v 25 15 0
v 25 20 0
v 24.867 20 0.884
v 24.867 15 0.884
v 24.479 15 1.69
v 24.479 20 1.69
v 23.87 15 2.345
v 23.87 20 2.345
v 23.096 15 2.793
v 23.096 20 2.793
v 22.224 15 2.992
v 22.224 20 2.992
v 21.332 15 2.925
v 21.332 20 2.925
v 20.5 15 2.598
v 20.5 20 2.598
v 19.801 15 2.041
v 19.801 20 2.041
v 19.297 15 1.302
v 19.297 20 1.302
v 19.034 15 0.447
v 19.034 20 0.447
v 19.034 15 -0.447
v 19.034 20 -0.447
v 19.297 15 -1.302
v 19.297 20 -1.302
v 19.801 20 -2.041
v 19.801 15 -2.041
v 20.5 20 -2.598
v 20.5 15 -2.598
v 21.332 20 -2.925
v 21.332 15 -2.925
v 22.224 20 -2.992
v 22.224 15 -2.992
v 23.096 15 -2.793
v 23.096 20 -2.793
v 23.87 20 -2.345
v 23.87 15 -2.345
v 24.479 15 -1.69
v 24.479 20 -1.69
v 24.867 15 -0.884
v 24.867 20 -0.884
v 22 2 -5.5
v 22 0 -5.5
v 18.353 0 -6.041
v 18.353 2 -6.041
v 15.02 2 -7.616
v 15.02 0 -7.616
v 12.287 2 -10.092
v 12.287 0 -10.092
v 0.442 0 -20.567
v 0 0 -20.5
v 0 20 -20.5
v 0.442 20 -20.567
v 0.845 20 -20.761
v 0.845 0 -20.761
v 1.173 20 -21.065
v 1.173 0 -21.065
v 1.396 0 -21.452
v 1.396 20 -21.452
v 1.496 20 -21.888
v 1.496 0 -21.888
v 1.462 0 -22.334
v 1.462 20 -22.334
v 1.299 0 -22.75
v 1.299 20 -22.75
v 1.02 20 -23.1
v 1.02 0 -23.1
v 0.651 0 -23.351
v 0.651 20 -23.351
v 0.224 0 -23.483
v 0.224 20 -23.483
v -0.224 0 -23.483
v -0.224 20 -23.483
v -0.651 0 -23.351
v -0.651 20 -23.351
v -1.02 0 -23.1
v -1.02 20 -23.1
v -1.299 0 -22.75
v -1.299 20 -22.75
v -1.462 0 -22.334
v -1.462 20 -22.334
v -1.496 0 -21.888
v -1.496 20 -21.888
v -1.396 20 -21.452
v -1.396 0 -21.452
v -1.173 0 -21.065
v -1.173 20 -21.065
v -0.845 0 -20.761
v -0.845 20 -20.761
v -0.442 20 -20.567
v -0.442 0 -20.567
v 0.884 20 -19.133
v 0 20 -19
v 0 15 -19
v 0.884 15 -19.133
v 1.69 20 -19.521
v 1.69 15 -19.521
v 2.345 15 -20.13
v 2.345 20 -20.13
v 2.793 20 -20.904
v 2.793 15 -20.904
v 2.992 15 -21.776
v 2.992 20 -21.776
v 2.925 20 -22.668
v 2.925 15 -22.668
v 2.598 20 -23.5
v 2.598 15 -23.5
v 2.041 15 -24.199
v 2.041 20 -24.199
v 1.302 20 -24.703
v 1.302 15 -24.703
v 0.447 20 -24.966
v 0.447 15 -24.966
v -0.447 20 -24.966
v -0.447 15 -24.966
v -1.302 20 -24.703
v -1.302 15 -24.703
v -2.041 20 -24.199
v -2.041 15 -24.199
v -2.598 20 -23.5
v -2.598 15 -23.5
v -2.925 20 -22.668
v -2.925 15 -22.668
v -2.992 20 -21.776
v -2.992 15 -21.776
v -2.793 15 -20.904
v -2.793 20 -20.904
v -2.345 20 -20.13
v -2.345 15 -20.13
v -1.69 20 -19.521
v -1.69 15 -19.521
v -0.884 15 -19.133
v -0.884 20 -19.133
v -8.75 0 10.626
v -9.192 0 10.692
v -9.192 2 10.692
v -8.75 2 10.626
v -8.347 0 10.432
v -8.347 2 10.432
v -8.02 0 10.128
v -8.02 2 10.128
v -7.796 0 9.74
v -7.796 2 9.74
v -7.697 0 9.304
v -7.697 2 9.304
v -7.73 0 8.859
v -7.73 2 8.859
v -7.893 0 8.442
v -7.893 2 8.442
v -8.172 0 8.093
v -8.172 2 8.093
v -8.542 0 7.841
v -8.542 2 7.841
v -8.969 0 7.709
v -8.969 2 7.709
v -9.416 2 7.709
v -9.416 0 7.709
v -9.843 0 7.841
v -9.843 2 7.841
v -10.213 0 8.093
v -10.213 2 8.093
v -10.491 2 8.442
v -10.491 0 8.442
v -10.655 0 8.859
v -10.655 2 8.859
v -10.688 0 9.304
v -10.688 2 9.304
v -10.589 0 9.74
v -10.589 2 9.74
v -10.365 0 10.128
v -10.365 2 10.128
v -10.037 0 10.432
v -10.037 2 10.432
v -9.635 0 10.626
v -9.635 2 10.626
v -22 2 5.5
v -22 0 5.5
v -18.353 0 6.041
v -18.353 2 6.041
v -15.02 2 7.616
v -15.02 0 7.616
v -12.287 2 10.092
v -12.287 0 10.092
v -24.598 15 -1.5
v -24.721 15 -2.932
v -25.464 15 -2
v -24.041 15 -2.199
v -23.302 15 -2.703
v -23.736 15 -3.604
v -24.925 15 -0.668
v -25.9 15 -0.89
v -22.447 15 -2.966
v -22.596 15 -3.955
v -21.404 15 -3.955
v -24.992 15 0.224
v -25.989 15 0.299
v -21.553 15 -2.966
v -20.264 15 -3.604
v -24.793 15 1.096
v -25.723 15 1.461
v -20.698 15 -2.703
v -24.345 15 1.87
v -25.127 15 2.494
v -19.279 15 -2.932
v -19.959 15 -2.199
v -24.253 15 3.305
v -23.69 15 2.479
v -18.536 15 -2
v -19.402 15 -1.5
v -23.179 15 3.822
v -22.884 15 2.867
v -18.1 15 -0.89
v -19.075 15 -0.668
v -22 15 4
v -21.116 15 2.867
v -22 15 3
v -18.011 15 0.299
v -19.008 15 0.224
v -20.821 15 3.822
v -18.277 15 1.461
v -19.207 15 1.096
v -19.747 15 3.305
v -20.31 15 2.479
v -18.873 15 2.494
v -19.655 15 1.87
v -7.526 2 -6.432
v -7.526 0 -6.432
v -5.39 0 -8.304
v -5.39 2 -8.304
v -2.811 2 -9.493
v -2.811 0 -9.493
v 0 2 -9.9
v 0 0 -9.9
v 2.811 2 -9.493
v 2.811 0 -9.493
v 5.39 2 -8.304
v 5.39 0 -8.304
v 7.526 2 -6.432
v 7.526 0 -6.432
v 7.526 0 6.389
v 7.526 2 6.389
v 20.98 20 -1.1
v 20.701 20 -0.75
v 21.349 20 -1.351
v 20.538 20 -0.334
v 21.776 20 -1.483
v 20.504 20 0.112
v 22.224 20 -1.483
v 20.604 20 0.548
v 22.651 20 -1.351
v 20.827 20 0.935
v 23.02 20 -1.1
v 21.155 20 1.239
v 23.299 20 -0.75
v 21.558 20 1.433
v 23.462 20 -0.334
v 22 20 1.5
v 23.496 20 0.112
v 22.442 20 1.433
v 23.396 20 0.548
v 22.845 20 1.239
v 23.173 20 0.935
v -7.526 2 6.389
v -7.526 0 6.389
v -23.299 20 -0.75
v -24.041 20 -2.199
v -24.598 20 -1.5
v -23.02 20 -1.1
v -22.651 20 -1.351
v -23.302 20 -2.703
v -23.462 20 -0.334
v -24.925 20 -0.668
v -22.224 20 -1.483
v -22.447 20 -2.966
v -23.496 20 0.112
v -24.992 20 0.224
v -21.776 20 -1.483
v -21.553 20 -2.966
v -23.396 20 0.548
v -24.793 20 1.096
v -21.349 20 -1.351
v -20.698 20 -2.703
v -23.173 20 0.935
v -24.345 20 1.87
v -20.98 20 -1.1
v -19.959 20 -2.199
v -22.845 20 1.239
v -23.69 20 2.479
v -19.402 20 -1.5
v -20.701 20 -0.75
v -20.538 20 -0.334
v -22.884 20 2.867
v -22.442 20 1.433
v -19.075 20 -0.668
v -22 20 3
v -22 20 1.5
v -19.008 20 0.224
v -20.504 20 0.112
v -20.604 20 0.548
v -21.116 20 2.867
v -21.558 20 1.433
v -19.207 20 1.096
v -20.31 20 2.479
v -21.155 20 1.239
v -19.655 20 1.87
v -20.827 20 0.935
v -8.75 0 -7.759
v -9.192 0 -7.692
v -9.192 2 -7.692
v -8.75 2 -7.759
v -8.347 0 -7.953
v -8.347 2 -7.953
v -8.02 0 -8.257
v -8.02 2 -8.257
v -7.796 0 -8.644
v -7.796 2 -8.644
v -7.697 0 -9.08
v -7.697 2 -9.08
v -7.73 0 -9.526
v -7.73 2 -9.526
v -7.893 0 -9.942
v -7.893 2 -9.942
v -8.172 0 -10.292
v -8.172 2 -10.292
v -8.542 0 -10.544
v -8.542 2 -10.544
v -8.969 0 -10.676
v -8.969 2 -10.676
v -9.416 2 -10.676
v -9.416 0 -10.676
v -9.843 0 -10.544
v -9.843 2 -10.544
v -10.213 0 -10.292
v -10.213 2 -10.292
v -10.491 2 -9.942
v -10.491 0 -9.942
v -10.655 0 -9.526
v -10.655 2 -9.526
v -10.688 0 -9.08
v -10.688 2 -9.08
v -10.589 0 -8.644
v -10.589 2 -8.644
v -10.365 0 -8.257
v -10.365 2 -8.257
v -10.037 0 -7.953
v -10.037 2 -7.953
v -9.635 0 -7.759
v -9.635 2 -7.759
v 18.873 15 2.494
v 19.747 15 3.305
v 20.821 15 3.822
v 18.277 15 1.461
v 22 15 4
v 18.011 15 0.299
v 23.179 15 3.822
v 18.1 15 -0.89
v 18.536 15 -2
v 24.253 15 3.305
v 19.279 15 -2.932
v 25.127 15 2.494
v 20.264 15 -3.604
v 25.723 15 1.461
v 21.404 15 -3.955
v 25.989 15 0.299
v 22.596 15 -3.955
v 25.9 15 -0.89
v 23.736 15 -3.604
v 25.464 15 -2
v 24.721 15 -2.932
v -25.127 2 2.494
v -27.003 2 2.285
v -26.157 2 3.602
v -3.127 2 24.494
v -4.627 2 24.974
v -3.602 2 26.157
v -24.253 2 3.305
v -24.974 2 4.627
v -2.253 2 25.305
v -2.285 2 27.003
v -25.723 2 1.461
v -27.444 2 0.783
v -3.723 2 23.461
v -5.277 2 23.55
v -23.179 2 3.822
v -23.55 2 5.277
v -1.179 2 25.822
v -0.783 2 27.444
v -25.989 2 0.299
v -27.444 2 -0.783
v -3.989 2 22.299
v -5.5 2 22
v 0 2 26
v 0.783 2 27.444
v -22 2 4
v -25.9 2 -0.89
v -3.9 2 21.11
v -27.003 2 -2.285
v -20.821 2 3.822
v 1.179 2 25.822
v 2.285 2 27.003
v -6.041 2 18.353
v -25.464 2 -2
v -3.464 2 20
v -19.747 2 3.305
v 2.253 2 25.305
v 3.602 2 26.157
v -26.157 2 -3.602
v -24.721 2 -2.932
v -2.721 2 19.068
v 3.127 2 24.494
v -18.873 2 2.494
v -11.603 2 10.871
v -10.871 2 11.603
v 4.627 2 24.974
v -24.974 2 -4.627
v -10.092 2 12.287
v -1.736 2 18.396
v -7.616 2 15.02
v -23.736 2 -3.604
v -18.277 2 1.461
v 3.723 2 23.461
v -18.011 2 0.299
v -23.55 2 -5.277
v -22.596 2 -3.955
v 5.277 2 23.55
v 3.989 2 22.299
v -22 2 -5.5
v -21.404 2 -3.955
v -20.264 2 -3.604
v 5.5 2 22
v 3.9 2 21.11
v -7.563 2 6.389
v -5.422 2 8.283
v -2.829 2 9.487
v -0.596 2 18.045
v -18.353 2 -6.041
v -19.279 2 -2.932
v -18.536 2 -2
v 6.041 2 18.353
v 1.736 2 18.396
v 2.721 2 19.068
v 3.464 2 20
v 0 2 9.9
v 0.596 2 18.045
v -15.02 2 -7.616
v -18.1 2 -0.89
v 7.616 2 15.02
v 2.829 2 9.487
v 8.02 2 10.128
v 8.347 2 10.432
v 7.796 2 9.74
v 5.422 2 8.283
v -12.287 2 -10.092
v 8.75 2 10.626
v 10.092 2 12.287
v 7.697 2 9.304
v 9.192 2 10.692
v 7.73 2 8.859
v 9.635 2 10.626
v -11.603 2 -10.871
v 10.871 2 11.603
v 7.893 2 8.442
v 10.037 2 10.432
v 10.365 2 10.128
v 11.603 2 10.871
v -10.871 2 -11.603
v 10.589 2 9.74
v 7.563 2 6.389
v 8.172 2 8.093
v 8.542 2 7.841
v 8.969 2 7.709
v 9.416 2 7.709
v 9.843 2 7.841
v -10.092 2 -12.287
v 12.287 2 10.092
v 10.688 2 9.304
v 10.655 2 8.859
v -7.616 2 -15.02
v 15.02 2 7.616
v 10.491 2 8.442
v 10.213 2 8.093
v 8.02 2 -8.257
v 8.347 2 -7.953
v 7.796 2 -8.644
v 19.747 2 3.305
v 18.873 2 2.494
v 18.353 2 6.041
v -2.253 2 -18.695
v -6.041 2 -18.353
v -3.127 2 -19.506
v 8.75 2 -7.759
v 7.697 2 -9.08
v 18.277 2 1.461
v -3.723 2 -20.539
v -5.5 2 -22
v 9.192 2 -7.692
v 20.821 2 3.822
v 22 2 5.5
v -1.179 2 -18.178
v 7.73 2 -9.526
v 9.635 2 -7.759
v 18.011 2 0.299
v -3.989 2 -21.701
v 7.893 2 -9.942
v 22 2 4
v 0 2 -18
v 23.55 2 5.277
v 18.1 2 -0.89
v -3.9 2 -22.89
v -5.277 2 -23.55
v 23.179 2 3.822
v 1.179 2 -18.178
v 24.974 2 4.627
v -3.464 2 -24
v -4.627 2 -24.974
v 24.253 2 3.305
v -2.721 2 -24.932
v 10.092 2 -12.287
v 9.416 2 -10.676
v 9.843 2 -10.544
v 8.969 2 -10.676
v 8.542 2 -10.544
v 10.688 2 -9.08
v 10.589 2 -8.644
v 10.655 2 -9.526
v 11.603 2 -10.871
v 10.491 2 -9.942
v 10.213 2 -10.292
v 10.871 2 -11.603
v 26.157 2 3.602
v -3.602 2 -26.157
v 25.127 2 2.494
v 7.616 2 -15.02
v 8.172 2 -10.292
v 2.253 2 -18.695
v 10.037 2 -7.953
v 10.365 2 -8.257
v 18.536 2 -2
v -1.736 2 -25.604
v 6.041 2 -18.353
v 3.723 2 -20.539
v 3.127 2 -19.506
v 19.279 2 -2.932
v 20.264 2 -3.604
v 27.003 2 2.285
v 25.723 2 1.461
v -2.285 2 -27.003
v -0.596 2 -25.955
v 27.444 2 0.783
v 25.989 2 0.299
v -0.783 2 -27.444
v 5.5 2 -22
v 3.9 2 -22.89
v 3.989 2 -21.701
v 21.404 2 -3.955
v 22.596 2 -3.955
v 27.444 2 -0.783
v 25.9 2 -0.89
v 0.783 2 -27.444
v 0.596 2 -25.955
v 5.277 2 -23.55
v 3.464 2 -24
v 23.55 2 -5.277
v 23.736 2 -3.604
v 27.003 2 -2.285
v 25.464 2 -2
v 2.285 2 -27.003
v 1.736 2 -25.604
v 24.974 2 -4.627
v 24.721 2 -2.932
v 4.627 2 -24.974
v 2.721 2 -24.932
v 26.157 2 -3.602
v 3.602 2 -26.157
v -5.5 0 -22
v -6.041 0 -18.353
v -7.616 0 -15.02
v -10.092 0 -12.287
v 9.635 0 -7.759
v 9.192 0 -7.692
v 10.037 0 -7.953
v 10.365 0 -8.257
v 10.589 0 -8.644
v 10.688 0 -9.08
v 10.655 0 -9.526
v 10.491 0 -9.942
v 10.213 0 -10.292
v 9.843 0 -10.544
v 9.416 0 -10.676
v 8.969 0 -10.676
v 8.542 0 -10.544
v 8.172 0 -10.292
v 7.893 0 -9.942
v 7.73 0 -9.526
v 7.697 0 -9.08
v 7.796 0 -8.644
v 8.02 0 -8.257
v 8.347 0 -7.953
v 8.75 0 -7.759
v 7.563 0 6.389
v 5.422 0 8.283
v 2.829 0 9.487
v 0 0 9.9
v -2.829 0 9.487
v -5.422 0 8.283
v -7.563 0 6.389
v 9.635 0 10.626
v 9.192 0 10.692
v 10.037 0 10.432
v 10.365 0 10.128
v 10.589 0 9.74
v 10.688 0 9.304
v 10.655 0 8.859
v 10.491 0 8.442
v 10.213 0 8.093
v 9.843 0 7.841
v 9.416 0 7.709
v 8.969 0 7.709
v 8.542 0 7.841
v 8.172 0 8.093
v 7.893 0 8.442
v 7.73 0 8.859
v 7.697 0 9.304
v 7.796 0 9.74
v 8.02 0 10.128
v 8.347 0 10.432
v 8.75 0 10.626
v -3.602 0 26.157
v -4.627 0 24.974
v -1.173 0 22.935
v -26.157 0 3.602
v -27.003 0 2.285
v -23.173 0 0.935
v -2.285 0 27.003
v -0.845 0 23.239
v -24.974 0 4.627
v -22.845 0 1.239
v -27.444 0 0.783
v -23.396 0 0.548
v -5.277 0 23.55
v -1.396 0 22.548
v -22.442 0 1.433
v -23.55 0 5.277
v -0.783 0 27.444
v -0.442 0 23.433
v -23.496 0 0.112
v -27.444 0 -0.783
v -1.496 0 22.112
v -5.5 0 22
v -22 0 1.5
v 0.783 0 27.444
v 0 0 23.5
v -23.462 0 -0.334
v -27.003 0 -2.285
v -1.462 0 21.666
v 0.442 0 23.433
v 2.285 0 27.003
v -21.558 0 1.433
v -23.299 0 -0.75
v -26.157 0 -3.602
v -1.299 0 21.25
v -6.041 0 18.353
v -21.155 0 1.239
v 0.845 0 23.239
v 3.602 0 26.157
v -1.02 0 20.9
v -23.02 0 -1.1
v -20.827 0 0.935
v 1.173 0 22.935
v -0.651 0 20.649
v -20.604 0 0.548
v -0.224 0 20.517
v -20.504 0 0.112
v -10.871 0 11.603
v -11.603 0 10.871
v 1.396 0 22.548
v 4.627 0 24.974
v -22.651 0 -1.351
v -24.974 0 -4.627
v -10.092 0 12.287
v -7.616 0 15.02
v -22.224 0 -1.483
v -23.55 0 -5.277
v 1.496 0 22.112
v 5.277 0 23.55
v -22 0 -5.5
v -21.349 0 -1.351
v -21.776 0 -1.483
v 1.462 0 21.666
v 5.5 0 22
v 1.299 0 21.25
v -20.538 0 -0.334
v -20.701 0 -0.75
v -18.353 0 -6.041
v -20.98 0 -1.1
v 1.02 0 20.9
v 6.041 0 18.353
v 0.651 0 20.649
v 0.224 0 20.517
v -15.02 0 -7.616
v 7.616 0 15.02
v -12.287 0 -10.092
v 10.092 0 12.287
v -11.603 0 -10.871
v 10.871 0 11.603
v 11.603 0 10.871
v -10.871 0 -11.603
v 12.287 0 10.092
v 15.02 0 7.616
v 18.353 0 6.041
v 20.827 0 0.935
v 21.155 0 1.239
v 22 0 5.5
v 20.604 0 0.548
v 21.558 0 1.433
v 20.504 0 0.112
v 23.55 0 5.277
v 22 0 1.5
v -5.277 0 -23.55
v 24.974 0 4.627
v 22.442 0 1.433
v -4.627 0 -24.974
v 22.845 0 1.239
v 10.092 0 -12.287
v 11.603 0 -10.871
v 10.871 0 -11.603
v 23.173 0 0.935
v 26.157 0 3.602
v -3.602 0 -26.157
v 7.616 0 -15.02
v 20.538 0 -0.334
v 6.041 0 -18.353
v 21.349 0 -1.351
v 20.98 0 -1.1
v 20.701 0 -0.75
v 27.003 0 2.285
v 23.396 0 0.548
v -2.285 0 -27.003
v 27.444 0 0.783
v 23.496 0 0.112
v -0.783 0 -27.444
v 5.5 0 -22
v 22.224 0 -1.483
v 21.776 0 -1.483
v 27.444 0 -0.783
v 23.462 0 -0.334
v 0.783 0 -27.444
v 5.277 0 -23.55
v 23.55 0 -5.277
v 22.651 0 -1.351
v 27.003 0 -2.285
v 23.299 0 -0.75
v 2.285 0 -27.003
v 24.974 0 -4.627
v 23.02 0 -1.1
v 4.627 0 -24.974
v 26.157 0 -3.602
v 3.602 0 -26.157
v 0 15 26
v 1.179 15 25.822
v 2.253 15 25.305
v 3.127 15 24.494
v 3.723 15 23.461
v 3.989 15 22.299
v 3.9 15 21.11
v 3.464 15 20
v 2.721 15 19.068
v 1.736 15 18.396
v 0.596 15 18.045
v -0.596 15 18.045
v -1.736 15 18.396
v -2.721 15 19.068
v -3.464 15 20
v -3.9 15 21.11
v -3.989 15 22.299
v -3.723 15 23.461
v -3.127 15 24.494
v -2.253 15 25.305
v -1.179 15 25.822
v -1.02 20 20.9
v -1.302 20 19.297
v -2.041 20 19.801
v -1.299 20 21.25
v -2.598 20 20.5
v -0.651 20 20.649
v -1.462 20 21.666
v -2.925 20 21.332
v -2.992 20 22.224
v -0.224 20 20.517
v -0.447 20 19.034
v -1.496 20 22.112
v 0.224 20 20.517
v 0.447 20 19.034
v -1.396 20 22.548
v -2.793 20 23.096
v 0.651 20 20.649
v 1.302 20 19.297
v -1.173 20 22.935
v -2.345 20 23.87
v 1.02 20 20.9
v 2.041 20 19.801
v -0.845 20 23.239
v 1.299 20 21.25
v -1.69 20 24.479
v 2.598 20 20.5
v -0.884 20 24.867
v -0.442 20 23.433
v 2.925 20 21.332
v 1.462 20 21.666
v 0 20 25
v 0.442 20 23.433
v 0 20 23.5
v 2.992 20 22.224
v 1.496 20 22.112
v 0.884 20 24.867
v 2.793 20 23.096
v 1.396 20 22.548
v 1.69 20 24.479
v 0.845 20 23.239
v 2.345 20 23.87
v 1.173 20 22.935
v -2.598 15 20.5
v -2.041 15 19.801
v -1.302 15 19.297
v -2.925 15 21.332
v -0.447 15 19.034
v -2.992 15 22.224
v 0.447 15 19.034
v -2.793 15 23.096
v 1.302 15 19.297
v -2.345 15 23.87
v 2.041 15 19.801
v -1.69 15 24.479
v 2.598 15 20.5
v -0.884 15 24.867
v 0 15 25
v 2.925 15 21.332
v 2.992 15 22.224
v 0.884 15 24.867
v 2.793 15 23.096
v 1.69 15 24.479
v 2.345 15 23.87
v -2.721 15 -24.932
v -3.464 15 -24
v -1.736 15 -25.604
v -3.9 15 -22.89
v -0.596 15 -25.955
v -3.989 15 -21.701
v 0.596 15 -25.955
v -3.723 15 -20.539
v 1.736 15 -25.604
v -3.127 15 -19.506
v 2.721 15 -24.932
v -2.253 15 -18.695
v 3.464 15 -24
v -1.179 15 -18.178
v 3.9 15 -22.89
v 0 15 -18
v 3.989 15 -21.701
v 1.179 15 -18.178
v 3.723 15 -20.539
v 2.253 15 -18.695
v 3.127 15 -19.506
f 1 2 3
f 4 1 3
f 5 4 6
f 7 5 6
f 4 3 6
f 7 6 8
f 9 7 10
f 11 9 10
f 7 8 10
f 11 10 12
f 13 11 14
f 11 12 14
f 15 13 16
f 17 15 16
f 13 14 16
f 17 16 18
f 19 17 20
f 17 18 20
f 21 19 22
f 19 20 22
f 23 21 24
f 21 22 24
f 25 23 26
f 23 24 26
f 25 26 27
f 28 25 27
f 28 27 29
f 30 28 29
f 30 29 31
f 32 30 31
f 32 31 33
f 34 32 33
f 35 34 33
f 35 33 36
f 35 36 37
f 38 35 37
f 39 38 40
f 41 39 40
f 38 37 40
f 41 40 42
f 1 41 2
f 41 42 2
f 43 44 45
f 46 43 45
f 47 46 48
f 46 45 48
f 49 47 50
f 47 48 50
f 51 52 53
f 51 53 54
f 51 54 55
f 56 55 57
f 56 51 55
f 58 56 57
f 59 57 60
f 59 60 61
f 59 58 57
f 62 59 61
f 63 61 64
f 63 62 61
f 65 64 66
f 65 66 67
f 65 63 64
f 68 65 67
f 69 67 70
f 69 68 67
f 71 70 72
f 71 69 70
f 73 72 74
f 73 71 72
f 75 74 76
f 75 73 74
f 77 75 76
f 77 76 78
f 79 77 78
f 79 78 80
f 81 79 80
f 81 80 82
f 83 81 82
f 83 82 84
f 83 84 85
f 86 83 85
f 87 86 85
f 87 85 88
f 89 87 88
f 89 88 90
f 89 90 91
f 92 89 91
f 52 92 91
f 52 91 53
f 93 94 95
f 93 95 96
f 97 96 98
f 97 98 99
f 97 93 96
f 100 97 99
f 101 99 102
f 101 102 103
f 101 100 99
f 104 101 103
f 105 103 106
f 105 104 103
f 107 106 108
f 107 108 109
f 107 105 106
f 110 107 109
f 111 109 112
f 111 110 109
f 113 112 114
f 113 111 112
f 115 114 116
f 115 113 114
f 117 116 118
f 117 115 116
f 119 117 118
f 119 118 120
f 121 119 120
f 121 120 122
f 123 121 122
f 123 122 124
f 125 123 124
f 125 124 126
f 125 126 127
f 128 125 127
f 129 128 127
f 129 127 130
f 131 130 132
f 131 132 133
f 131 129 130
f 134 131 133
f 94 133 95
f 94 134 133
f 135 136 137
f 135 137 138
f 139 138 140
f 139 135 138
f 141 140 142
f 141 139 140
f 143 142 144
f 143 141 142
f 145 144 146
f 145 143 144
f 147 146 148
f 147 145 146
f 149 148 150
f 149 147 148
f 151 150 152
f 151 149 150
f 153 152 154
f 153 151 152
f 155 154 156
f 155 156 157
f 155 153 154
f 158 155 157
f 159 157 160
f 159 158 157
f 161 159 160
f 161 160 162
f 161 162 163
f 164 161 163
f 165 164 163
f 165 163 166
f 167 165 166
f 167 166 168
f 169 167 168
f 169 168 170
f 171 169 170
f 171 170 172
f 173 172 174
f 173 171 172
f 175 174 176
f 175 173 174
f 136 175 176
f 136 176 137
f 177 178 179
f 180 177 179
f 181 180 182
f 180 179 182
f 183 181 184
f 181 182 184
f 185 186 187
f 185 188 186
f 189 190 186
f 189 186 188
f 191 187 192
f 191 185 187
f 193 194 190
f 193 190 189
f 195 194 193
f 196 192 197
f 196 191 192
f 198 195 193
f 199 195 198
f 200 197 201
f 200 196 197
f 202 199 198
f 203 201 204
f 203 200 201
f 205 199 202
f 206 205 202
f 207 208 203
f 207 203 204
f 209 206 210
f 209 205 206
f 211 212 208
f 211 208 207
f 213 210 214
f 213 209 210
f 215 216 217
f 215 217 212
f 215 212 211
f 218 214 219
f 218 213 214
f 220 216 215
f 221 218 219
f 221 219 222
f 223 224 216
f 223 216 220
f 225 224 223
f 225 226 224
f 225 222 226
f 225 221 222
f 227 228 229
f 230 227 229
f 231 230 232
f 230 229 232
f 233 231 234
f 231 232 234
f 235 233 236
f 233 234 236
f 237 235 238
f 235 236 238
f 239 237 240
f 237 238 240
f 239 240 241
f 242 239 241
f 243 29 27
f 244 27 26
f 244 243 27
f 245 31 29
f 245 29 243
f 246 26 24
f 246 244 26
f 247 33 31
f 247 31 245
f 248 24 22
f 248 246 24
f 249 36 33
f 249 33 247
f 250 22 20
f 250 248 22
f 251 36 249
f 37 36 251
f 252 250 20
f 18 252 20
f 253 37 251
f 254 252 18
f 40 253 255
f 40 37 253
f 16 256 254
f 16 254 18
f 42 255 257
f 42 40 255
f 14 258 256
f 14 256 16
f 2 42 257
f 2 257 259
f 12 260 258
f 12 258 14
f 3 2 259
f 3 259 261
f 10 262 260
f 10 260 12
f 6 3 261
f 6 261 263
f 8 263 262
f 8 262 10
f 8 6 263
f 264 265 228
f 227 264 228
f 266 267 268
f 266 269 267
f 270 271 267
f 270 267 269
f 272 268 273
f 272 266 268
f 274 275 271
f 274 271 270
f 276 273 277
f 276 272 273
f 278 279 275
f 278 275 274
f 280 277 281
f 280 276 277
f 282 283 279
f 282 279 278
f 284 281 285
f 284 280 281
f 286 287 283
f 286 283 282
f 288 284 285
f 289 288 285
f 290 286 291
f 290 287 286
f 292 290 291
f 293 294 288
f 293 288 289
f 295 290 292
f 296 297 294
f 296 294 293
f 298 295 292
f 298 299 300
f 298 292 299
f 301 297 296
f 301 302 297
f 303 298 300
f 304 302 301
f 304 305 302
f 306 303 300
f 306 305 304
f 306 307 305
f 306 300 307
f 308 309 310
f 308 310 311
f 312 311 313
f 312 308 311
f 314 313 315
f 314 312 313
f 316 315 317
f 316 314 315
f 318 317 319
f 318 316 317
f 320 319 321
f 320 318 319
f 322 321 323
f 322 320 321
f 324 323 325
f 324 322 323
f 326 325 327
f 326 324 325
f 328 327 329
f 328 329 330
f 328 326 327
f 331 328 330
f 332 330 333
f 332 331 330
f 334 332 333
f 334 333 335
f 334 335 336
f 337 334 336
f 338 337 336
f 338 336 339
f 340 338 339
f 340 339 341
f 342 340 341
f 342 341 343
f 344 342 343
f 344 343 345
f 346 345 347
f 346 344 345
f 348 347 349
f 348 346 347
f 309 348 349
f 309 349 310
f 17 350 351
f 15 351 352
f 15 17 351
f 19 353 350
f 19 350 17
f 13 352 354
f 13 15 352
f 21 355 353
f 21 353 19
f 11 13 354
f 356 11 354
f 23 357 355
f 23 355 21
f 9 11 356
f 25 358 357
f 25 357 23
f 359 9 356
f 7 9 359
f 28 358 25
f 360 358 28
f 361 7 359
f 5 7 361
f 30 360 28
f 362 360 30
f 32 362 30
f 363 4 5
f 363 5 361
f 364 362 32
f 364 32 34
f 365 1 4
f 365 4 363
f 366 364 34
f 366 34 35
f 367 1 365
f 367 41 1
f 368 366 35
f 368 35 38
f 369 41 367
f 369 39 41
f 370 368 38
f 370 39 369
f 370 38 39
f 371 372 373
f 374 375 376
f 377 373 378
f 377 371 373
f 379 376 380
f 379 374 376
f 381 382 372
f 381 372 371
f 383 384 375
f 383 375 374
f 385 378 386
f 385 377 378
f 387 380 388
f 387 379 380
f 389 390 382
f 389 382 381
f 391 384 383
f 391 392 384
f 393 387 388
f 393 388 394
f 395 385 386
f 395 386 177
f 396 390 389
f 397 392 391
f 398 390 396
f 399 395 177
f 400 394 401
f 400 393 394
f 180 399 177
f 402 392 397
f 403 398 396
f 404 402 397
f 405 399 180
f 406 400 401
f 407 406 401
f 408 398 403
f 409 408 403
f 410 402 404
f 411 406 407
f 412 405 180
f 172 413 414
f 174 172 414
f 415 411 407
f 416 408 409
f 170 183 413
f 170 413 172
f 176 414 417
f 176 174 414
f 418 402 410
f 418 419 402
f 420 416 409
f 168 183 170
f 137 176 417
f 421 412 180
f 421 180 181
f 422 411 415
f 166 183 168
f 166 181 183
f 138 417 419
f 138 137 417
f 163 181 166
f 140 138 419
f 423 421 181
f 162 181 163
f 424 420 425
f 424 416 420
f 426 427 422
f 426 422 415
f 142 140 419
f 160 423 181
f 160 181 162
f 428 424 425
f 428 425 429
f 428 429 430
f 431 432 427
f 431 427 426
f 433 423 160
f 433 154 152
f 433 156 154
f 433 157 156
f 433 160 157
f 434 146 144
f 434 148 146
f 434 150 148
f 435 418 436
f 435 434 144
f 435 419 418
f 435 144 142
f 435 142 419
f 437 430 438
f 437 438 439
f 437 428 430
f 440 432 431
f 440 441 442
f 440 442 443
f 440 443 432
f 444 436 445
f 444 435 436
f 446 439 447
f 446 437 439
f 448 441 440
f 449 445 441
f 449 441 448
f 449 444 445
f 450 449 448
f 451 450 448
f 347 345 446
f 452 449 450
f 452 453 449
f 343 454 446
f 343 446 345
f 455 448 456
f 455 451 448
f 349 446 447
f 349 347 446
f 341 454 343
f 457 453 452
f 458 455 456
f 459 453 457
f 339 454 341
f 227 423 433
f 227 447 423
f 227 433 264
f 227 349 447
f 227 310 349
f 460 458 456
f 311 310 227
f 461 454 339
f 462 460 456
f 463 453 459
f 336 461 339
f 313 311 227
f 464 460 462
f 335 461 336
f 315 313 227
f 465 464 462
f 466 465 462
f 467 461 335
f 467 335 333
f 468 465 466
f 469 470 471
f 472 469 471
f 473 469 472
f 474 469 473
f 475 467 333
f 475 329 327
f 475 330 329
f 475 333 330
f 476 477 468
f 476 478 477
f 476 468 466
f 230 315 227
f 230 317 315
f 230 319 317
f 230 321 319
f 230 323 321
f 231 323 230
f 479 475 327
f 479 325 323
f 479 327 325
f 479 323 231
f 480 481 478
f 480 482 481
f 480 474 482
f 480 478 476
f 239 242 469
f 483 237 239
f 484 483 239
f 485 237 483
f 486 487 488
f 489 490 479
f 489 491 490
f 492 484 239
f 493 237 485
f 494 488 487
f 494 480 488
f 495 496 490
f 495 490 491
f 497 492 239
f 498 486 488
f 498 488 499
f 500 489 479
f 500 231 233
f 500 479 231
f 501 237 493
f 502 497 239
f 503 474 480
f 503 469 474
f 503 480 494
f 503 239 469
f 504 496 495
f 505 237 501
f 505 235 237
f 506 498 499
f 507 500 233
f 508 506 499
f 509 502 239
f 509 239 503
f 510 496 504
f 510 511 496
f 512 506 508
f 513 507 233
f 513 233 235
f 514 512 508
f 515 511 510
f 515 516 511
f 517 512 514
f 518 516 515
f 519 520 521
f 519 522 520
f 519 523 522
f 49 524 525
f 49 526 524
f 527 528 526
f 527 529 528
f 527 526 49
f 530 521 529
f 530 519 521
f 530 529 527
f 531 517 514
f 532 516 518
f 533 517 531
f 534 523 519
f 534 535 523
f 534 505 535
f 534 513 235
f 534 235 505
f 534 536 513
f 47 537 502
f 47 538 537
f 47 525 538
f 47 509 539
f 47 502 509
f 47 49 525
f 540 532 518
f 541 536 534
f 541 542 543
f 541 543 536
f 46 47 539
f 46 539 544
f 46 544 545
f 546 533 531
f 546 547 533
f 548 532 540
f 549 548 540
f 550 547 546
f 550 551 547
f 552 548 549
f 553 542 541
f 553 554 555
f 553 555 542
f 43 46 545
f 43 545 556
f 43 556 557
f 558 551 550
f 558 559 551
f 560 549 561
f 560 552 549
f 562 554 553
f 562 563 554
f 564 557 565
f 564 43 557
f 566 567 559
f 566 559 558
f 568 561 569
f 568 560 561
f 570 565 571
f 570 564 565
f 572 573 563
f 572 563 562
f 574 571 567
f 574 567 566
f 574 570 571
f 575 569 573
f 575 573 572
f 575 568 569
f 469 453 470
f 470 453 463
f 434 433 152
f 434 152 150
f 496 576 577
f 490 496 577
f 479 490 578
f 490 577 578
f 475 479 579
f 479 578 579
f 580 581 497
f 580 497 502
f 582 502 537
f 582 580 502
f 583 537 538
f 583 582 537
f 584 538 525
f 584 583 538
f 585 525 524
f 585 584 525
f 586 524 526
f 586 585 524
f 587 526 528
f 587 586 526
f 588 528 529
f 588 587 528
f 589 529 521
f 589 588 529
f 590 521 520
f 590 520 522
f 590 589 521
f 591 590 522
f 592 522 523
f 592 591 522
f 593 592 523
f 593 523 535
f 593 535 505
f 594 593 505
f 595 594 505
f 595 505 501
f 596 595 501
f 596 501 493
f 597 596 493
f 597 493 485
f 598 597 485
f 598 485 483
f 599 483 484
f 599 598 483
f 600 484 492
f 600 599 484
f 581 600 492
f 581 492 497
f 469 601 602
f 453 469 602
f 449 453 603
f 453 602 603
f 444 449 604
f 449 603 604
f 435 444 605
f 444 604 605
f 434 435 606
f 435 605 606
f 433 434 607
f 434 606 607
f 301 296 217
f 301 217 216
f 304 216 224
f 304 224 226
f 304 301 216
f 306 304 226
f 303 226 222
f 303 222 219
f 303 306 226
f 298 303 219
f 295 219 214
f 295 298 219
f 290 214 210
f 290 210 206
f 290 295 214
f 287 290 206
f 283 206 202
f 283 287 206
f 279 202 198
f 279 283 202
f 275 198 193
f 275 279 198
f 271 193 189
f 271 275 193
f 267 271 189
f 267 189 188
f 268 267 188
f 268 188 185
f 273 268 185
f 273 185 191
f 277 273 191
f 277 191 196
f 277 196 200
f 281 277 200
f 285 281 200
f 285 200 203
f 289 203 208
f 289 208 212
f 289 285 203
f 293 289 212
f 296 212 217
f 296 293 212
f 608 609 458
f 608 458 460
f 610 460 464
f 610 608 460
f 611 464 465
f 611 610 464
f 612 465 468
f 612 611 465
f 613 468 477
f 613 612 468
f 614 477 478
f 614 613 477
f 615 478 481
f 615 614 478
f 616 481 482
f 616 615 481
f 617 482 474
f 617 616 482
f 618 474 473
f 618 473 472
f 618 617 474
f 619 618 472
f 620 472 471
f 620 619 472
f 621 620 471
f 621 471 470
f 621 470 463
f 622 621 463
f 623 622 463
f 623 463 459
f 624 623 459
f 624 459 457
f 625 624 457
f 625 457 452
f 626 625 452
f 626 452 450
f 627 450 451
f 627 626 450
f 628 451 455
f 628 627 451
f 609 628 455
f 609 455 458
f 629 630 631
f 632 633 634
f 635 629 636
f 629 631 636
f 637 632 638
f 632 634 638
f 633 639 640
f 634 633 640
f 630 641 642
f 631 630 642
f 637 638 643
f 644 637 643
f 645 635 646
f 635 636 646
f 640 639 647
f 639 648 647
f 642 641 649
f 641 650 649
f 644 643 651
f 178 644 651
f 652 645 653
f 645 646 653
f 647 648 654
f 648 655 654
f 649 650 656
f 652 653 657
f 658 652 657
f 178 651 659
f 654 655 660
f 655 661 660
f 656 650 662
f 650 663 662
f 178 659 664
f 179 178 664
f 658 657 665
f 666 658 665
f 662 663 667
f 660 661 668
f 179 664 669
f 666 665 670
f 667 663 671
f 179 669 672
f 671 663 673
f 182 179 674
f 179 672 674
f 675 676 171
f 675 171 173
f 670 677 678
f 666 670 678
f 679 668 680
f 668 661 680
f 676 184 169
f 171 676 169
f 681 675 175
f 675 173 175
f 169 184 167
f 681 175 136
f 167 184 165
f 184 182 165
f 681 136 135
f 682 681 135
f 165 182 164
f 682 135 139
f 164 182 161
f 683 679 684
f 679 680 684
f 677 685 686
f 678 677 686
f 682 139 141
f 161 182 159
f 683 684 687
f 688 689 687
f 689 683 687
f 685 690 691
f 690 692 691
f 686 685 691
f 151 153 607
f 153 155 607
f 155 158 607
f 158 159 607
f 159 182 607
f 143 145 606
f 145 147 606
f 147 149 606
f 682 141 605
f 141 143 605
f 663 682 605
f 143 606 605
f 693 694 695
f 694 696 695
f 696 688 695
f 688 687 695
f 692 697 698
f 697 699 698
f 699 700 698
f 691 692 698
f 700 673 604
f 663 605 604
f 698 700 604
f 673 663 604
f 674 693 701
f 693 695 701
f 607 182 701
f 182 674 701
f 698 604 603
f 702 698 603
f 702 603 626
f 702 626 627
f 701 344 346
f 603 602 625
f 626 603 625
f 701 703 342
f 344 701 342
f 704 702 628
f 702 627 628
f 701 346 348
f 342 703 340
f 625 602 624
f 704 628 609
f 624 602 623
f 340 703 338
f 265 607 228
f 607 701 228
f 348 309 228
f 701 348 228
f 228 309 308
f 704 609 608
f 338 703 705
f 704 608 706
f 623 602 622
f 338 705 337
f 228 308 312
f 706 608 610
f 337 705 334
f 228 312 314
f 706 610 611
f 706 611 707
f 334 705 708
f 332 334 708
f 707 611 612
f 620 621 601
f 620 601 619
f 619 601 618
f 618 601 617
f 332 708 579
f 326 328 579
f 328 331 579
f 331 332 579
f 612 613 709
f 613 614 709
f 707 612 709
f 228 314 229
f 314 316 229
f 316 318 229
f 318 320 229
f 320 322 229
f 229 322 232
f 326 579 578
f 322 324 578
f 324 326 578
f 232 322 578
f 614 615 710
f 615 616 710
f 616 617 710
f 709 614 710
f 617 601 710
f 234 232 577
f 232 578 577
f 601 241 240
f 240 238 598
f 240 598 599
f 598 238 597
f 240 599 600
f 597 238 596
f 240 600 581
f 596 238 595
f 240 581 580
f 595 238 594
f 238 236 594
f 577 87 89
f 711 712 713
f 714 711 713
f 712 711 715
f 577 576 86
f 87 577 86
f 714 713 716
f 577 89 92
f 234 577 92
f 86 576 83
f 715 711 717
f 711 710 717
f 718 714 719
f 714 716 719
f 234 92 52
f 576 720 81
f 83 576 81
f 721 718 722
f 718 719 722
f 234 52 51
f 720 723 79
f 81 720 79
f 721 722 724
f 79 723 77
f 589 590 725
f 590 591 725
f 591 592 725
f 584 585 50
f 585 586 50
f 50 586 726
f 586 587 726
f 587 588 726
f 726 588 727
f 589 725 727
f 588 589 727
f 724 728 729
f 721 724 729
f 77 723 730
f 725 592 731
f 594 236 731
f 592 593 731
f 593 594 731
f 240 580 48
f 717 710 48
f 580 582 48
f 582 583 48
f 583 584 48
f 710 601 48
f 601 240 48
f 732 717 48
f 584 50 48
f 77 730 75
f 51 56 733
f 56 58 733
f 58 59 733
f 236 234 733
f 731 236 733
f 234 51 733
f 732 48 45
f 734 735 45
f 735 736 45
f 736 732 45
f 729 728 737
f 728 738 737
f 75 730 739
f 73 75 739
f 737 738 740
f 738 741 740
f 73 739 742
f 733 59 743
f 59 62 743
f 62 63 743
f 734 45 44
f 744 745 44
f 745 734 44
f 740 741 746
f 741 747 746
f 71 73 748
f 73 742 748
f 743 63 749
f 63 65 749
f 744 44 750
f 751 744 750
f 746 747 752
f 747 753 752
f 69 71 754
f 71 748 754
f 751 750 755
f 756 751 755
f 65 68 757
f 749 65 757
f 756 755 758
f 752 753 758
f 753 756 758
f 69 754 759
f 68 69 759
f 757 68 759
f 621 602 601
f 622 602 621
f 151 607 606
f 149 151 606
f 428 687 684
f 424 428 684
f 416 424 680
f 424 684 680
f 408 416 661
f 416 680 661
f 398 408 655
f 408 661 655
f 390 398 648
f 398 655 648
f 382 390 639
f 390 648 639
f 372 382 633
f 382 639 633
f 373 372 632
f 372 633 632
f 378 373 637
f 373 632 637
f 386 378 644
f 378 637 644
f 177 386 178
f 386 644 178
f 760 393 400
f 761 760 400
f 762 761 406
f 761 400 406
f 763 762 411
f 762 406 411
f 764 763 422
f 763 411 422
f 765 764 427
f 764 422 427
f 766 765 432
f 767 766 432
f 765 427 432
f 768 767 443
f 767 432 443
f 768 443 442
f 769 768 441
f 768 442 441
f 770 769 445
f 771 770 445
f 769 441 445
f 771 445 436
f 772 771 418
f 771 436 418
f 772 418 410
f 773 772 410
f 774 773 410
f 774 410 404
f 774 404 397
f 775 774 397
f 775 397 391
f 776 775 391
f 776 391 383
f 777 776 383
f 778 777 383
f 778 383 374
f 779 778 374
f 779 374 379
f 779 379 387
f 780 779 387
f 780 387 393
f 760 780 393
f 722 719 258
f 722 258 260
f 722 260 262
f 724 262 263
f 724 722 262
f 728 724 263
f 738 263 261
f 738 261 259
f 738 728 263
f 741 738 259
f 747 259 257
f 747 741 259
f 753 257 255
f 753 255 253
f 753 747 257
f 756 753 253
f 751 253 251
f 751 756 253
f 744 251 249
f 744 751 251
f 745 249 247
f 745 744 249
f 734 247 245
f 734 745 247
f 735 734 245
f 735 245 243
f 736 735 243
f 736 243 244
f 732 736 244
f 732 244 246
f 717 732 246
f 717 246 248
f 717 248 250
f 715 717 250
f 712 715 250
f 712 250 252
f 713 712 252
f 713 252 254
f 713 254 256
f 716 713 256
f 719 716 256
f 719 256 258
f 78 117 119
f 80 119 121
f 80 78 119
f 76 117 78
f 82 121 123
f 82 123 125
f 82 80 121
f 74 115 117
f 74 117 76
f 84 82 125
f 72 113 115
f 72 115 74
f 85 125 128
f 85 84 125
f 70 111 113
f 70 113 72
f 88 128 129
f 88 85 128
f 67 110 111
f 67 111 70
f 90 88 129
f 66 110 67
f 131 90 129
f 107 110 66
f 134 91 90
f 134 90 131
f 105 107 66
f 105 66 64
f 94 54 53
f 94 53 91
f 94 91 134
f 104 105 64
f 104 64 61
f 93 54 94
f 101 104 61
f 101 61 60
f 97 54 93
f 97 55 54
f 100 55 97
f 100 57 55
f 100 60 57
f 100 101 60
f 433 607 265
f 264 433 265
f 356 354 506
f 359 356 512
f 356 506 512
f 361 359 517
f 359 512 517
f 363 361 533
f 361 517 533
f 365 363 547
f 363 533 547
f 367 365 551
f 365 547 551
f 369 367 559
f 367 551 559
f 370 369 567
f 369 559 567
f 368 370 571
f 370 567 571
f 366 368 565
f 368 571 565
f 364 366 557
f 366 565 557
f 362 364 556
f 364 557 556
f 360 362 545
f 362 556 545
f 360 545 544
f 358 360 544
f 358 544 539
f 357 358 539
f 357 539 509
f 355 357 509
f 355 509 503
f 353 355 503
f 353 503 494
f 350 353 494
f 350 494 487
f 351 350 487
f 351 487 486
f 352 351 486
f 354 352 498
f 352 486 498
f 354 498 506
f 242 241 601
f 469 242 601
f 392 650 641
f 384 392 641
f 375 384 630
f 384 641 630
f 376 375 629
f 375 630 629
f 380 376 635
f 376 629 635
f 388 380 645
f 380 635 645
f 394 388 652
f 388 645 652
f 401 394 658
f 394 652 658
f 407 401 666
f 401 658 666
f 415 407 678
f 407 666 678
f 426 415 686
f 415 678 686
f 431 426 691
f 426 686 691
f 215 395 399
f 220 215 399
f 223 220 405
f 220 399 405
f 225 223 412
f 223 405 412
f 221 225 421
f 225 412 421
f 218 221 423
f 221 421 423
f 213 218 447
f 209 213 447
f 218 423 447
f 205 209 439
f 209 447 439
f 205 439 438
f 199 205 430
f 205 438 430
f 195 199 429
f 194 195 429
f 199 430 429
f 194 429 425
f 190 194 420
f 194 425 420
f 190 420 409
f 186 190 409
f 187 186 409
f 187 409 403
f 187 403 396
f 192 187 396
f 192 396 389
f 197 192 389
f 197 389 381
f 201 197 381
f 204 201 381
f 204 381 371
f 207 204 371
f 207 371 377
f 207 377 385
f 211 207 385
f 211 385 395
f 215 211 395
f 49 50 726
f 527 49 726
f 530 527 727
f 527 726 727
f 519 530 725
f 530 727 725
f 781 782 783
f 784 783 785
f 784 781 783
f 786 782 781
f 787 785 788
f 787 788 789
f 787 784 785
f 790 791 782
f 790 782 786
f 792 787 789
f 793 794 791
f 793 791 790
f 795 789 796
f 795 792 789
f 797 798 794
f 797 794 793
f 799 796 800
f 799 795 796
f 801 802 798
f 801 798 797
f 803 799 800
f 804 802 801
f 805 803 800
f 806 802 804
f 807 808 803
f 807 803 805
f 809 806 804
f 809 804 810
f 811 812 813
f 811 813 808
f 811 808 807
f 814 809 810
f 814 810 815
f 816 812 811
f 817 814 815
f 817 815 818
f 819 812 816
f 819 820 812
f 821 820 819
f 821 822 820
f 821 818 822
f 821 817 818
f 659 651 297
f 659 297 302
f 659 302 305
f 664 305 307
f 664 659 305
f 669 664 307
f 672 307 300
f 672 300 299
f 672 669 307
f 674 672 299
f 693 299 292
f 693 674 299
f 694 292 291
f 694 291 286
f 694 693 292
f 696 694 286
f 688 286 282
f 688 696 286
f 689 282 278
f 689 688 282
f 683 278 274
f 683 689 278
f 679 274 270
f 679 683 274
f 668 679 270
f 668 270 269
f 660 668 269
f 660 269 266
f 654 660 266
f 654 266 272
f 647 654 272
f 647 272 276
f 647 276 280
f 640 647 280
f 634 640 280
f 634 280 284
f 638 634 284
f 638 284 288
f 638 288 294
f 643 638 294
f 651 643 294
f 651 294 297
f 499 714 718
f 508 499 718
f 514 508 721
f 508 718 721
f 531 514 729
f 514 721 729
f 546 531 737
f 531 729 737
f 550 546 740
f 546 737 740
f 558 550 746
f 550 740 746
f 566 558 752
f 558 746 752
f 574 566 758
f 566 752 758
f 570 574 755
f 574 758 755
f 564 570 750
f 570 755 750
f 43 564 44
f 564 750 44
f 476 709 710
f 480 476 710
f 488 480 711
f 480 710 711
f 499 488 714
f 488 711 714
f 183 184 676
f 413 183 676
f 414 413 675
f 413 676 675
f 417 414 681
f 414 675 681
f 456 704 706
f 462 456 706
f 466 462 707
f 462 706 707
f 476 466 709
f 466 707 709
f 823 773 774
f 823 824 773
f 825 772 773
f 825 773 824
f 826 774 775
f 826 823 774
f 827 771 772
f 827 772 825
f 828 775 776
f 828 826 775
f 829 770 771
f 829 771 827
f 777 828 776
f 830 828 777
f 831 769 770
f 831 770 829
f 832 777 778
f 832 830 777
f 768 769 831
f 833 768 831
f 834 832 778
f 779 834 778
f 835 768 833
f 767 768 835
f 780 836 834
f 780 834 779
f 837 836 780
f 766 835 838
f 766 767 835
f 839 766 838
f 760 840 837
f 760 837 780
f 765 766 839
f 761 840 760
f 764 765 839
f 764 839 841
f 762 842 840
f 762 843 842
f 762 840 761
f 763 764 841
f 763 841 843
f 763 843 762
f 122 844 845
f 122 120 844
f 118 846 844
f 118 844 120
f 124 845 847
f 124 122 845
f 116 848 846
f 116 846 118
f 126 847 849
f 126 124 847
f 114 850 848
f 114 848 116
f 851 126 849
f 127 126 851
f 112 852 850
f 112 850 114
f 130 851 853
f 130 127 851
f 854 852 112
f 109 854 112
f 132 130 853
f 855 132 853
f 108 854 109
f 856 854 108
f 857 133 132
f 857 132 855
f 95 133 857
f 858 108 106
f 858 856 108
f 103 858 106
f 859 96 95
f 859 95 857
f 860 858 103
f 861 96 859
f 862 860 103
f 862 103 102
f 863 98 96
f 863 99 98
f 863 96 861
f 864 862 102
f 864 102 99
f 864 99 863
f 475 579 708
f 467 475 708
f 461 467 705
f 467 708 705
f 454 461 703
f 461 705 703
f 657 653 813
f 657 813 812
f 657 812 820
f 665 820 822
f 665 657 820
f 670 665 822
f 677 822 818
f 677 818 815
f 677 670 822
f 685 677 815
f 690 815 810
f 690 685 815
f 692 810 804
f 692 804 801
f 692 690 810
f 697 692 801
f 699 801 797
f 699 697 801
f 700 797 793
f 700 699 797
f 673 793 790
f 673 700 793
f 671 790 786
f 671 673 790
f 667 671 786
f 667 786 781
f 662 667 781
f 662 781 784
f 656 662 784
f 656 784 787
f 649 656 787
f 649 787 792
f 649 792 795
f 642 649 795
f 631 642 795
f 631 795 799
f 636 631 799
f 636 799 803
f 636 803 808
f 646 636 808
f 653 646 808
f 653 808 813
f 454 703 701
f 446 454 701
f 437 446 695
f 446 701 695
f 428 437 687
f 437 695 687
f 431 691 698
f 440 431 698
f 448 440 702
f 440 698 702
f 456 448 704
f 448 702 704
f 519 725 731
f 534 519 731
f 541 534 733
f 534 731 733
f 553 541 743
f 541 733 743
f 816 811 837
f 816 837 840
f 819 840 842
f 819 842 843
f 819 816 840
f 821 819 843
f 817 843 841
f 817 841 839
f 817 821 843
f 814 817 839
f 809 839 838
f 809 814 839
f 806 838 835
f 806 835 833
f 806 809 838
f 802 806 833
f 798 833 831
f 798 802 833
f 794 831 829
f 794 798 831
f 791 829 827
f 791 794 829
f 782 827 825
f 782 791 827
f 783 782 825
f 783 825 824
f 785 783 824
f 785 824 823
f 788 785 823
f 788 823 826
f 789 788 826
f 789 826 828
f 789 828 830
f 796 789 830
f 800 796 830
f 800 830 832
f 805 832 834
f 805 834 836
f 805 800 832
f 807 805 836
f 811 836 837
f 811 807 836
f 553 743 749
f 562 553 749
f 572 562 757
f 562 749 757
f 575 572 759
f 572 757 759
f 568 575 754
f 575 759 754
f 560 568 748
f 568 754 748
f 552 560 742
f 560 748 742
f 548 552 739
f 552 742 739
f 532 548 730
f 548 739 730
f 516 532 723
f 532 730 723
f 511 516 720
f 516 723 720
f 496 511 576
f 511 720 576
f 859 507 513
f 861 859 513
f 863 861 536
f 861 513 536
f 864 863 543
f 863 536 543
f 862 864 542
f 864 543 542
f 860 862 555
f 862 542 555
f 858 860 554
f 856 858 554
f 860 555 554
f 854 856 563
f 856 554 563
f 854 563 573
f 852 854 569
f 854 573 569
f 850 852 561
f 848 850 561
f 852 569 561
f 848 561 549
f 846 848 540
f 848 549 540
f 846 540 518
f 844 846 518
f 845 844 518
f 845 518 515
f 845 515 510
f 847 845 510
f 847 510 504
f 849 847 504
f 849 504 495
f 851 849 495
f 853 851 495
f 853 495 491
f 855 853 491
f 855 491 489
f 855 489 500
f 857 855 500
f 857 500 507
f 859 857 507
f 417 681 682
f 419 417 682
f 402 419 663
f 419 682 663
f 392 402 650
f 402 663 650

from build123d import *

# Parameters (mm, degrees)
SKETCH2_R           = 1.5
BOSS_EXTRUDE1_DEPTH = 2
SKETCH2_4_R         = 4
SKETCH2_4_R_2       = 1.5
BOSS_EXTRUDE2_DEPTH = 20
CUT_EXTRUDE1_START  = 20
SKETCH2_5_R         = 4
SKETCH2_5_R_2       = 3
CUT_EXTRUDE1_DEPTH  = 5


with BuildPart() as part:
    # Sketch2 → Boss-Extrude1 (new body)
    with BuildSketch(Plane(origin=(0, 0, 0), x_dir=(1, 0, 0), z_dir=(0, 1, 0))):
        with BuildLine():
            ThreePointArc((22, -5.5), (27.5, 0), (22, 5.5))
            ThreePointArc((22, 5.5), (16.628166969, 6.705737819), (12.286949473, 10.091623885))
            ThreePointArc((12.286949473, 10.091623885), (11.242997821, 11.242997821), (10.091623885, 12.286949473))
            ThreePointArc((10.091623885, 12.286949473), (6.705737819, 16.628166969), (5.5, 22))
            ThreePointArc((5.5, 22), (0, 27.5), (-5.5, 22))
            ThreePointArc((-5.5, 22), (-6.705737819, 16.628166969), (-10.091623885, 12.286949473))
            ThreePointArc((-10.091623885, 12.286949473), (-11.242997821, 11.242997821), (-12.286949473, 10.091623885))
            ThreePointArc((-12.286949473, 10.091623885), (-16.628166969, 6.705737819), (-22, 5.5))
            ThreePointArc((-22, 5.5), (-27.5, 0), (-22, -5.5))
            ThreePointArc((-22, -5.5), (-16.628166969, -6.705737819), (-12.286949473, -10.091623885))
            ThreePointArc((-12.286949473, -10.091623885), (-11.242997821, -11.242997821), (-10.091623885, -12.286949473))
            ThreePointArc((-10.091623885, -12.286949473), (-6.705737819, -16.628166969), (-5.5, -22))
            ThreePointArc((-5.5, -22), (0, -27.5), (5.5, -22))
            ThreePointArc((5.5, -22), (6.705737819, -16.628166969), (10.091623885, -12.286949473))
            ThreePointArc((10.091623885, -12.286949473), (11.242997821, -11.242997821), (12.286949473, -10.091623885))
            ThreePointArc((12.286949473, -10.091623885), (16.628166969, -6.705737819), (22, -5.5))
        make_face()
        with Locations(Location((-22, 0, 0), (0, 0, 270))):
            Circle(SKETCH2_R, mode=Mode.SUBTRACT)
        with Locations(Location((-9.192388155, -9.192388155, 0), (0, 0, 270))):
            Circle(SKETCH2_R, mode=Mode.SUBTRACT)
        with BuildLine():
            Line((7.526291329, 6.431558041), (7.526291329, 0))
            Line((7.526291329, 0), (7.526291329, -6.388653952))
            Line((7.526291329, -6.388653952), (7.562744256, -6.388653952))
            ThreePointArc((7.562744256, -6.388653952), (-1e-09, -9.9), (-7.562744258, -6.38865395))
            Line((-7.562744258, -6.38865395), (-7.526291329, -6.388653952))
            Line((-7.526291329, -6.388653952), (-7.526291329, 6.431558041))
            ThreePointArc((-7.526291329, 6.431558041), (0, 9.9), (7.526291329, 6.431558041))
        make_face(mode=Mode.SUBTRACT)
        with Locations(Location((0, -22, 0), (0, 0, 270))):
            Circle(SKETCH2_R, mode=Mode.SUBTRACT)
        with Locations(Location((9.192388155, -9.192388155, 0), (0, 0, 270))):
            Circle(SKETCH2_R, mode=Mode.SUBTRACT)
        with Locations(Location((22, 0, 0), (0, 0, 270))):
            Circle(SKETCH2_R, mode=Mode.SUBTRACT)
        with Locations(Location((-9.192388155, 9.192388155, 0), (0, 0, 270))):
            Circle(SKETCH2_R, mode=Mode.SUBTRACT)
        with Locations(Location((9.192388155, 9.192388155, 0), (0, 0, 270))):
            Circle(SKETCH2_R, mode=Mode.SUBTRACT)
        with Locations(Location((0, 22, 0), (0, 0, 270))):
            Circle(SKETCH2_R, mode=Mode.SUBTRACT)
    extrude(amount=BOSS_EXTRUDE1_DEPTH)

    # Sketch2<4> → Boss-Extrude2 (add)
    with BuildSketch(Plane(origin=(0, 0, 0), x_dir=(1, 0, 0), z_dir=(0, 1, 0))):
        with Locations(Location((22, 0, 0), (0, 0, 270))):
            Circle(SKETCH2_4_R)
        with Locations(Location((22, 0, 0), (0, 0, 270))):
            Circle(SKETCH2_4_R_2, mode=Mode.SUBTRACT)
        with Locations(Location((0, -22, 0), (0, 0, 270))):
            Circle(SKETCH2_4_R)
        with Locations(Location((0, -22, 0), (0, 0, 270))):
            Circle(SKETCH2_4_R_2, mode=Mode.SUBTRACT)
        with Locations(Location((-22, 0, 0), (0, 0, 270))):
            Circle(SKETCH2_4_R)
        with Locations(Location((-22, 0, 0), (0, 0, 270))):
            Circle(SKETCH2_4_R_2, mode=Mode.SUBTRACT)
        with Locations(Location((0, 22, 0), (0, 0, 270))):
            Circle(SKETCH2_4_R)
        with Locations(Location((0, 22, 0), (0, 0, 270))):
            Circle(SKETCH2_4_R_2, mode=Mode.SUBTRACT)
    extrude(amount=BOSS_EXTRUDE2_DEPTH)

    # Sketch2<5> → Cut-Extrude1 (cut)
    with BuildSketch(Plane(origin=(0, 0, 0), x_dir=(1, 0, 0), z_dir=(0, 1, 0)).offset(CUT_EXTRUDE1_START)):
        with Locations(Location((-22, 0, 0), (0, 0, 270))):
            Circle(SKETCH2_5_R)
        with Locations(Location((-22, 0, 0), (0, 0, 270))):
            Circle(SKETCH2_5_R_2, mode=Mode.SUBTRACT)
        with Locations(Location((0, 22, 0), (0, 0, 270))):
            Circle(SKETCH2_5_R)
        with Locations(Location((0, 22, 0), (0, 0, 270))):
            Circle(SKETCH2_5_R_2, mode=Mode.SUBTRACT)
        with BuildLine():
            ThreePointArc((19, 0), (22, 3), (25, 0))
            Line((25, 0), (26, 0))
            ThreePointArc((26, 0), (22, 4), (18, 0))
            Line((18, 0), (19, 0))
        make_face()
        with BuildLine():
            Line((26, 0), (25, 0))
            ThreePointArc((25, 0), (22, -3), (19, 0))
            Line((19, 0), (18, 0))
            ThreePointArc((18, 0), (22, -4), (26, 0))
        make_face()
        with Locations(Location((0, -22, 0), (0, 0, 270))):
            Circle(SKETCH2_5_R)
        with Locations(Location((0, -22, 0), (0, 0, 270))):
            Circle(SKETCH2_5_R_2, mode=Mode.SUBTRACT)
    extrude(amount=-CUT_EXTRUDE1_DEPTH, mode=Mode.SUBTRACT)


solid = part.part
